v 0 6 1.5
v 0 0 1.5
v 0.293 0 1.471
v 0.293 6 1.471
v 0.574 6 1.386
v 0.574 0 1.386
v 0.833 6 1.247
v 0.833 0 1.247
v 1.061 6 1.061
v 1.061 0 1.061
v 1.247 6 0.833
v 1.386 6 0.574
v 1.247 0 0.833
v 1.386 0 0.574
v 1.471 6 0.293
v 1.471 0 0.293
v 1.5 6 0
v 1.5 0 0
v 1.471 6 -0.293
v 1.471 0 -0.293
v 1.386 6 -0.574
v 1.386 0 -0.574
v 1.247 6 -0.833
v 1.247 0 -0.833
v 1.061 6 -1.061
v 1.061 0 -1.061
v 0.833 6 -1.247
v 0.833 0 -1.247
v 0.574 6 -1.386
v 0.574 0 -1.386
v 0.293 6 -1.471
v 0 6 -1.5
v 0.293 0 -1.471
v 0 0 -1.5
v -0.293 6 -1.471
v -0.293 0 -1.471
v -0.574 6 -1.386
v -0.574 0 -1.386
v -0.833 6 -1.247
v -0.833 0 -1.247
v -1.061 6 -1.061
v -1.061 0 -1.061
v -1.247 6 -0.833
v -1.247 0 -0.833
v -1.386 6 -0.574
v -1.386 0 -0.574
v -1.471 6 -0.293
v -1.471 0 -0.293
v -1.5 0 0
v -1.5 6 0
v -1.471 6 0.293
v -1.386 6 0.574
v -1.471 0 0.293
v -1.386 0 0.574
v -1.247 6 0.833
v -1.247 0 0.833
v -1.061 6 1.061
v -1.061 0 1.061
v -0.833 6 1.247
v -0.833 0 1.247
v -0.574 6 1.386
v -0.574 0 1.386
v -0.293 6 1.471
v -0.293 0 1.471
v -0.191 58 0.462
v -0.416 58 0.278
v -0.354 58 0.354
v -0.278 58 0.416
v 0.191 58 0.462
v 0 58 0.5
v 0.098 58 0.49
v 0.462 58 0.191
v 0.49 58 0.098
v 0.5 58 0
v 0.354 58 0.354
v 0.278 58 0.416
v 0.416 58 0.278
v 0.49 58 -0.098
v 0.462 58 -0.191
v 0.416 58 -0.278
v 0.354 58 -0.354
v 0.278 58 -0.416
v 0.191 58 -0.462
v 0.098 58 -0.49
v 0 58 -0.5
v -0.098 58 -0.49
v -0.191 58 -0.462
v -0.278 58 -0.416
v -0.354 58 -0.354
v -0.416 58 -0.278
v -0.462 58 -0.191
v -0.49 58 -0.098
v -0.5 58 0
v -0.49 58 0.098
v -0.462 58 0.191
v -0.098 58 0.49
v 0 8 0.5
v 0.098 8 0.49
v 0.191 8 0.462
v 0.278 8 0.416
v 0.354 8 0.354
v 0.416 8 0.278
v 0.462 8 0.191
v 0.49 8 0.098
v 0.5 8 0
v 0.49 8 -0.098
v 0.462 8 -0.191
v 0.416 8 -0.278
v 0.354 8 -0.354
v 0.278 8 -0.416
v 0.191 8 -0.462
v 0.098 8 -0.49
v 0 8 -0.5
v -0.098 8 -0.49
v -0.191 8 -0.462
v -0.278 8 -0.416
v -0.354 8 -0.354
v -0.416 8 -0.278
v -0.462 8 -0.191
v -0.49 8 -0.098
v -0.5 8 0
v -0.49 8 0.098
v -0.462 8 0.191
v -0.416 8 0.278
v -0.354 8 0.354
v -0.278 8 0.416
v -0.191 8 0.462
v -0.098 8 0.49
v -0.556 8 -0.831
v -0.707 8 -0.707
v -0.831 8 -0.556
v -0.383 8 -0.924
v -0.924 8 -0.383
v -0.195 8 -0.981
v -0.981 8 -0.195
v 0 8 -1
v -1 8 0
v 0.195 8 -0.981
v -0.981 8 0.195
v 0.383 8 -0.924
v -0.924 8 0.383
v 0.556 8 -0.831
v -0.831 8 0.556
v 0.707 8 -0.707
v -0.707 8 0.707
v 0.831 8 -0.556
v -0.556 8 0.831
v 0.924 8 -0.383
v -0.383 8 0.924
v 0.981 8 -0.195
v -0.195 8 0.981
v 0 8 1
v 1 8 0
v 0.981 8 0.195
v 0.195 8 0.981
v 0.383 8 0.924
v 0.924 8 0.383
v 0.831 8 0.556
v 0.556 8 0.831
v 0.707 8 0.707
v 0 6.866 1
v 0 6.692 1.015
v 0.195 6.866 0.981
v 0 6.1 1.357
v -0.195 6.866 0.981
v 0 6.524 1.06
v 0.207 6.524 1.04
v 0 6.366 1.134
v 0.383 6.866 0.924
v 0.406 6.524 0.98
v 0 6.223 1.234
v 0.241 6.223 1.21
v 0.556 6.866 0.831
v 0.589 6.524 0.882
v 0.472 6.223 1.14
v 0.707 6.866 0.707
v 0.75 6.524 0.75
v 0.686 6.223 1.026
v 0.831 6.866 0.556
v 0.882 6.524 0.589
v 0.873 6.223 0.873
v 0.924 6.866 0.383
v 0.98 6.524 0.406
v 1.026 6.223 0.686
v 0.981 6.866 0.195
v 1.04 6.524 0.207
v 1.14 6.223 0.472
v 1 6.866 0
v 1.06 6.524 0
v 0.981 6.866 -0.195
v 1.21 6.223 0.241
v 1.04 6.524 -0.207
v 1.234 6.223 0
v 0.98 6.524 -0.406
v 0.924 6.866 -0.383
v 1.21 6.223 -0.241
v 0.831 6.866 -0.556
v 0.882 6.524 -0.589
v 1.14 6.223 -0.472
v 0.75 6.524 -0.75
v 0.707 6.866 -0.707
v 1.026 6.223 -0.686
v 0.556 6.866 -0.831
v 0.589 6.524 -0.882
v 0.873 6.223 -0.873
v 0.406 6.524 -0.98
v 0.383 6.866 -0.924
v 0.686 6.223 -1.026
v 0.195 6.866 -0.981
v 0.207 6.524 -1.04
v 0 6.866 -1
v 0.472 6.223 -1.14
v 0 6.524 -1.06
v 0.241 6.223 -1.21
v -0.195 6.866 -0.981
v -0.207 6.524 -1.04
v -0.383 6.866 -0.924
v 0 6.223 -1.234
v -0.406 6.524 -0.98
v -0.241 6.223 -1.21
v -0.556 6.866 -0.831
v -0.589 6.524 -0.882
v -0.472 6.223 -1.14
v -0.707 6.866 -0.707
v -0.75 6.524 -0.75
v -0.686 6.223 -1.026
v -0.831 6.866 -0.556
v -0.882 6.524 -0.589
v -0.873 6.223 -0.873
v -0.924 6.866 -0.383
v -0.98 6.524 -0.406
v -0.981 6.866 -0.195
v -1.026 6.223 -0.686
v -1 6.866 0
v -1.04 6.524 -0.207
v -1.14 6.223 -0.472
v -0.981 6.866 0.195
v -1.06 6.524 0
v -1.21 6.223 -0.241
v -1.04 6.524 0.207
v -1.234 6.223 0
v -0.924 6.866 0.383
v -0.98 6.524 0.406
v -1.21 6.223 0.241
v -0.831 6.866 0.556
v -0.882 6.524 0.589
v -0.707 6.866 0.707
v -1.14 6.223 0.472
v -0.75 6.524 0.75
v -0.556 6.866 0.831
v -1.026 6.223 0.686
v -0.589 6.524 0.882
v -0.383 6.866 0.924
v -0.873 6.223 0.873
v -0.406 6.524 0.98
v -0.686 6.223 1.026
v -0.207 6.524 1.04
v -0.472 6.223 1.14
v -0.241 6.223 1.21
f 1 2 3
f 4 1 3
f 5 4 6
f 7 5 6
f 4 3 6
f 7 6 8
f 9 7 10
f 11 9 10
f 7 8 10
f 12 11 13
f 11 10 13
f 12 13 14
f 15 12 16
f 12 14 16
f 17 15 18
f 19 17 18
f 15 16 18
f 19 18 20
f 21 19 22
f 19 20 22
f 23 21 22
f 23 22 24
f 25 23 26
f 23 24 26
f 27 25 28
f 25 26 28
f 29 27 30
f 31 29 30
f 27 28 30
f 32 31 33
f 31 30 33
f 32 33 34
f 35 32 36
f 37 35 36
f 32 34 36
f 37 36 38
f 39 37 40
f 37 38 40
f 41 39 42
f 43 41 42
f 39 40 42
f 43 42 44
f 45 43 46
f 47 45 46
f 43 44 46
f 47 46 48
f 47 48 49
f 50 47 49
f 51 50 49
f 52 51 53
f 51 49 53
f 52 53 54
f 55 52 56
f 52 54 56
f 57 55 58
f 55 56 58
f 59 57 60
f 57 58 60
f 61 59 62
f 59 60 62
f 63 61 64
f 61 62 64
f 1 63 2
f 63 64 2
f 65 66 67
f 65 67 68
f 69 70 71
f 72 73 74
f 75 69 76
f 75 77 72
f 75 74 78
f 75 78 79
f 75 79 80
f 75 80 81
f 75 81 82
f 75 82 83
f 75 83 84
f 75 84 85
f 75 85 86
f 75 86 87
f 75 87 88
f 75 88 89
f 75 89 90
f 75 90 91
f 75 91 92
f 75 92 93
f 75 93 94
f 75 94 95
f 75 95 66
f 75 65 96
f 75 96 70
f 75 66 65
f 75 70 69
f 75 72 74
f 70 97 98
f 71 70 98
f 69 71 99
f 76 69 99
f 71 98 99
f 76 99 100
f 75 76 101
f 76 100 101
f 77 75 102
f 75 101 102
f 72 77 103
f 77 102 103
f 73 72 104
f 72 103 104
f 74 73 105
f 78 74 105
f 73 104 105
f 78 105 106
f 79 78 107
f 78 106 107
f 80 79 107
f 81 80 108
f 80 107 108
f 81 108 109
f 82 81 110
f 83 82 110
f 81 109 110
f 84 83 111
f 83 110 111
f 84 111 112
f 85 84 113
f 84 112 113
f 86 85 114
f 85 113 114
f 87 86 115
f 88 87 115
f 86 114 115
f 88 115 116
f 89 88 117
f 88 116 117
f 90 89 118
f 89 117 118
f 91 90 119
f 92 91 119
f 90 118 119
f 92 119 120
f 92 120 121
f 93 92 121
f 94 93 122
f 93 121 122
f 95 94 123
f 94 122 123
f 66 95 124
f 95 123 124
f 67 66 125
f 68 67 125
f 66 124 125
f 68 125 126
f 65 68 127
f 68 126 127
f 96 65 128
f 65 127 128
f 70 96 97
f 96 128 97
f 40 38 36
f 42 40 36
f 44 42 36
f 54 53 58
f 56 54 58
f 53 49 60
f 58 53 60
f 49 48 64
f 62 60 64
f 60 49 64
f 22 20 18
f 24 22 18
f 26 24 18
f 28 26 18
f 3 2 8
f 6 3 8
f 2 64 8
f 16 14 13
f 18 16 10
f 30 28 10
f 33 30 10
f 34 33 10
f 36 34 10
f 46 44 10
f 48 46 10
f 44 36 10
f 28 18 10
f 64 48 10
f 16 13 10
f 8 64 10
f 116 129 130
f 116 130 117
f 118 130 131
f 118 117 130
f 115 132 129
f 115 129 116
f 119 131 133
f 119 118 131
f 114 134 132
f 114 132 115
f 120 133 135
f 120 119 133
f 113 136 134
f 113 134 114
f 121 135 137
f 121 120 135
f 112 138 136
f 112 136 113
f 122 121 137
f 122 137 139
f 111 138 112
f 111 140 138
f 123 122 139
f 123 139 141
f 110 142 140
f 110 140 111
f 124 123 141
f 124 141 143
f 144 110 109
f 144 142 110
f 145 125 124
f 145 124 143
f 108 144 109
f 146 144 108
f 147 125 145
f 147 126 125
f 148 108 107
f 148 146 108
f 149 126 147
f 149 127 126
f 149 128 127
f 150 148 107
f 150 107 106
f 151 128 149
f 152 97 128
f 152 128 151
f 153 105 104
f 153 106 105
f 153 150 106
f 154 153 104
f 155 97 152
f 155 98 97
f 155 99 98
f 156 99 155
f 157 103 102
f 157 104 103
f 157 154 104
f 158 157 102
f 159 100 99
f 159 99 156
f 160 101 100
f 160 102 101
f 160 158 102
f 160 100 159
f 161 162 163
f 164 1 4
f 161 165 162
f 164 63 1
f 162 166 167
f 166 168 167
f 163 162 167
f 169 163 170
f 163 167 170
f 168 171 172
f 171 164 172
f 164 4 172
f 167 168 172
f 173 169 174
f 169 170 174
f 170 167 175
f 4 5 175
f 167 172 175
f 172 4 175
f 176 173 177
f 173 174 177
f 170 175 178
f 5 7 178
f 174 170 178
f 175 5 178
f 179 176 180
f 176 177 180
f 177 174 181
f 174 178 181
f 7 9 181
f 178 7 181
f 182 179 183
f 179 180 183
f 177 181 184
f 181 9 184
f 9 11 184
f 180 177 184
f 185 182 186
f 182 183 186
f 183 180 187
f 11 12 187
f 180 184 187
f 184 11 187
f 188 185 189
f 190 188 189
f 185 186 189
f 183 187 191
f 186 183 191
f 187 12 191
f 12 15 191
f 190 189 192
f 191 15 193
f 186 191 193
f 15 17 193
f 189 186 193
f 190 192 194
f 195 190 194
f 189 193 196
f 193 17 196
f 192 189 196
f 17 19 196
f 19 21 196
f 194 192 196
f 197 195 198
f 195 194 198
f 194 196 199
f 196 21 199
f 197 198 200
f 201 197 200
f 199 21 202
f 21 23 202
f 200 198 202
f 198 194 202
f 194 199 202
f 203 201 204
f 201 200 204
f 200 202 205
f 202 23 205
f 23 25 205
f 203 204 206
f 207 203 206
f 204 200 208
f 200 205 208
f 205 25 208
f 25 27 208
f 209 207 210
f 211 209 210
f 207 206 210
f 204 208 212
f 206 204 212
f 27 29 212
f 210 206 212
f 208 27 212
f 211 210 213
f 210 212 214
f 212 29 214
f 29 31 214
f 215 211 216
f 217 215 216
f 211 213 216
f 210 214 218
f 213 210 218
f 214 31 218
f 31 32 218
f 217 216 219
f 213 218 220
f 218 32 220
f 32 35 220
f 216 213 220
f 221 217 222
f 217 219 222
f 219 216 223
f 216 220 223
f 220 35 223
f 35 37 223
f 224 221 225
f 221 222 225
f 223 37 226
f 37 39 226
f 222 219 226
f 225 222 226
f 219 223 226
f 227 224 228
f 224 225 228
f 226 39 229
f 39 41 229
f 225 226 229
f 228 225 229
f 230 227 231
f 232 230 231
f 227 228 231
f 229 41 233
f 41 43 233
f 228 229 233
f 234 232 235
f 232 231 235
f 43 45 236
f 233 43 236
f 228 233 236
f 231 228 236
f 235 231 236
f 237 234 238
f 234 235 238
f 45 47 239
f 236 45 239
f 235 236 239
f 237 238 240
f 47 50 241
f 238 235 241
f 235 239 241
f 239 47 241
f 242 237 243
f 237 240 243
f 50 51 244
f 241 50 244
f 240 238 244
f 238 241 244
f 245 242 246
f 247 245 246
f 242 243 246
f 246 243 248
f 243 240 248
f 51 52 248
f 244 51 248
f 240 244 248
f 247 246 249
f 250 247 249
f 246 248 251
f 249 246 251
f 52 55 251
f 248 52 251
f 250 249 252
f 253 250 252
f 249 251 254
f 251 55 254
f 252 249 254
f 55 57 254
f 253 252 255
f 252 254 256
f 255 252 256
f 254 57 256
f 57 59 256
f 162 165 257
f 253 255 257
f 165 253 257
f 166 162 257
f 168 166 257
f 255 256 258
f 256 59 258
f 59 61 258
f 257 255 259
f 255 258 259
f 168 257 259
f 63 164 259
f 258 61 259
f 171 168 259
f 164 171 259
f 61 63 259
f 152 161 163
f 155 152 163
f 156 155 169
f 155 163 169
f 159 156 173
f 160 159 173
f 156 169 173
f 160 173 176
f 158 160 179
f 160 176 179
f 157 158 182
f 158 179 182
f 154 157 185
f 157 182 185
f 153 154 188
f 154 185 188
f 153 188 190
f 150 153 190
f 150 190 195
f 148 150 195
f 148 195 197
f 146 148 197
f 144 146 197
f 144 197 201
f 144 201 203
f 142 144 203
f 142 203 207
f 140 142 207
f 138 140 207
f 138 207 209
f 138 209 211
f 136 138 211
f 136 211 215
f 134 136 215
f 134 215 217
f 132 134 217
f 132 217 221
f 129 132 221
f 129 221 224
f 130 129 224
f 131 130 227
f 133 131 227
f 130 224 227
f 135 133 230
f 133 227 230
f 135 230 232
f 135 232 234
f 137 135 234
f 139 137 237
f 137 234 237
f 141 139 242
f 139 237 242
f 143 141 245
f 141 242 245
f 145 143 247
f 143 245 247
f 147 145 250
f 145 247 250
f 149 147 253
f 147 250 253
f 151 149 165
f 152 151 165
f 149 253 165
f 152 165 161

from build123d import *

# Parameters (mm, degrees)
SKETCH1_R           = 1.5
BOSS_EXTRUDE1_DEPTH = 6
SKETCH2_R           = 1
BOSS_EXTRUDE2_DEPTH = 2
FILLET1_R           = 1
SKETCH3_R           = 0.5
BOSS_EXTRUDE3_DEPTH = 50


with BuildPart() as part:
    # Sketch1 → Boss-Extrude1 (new body)
    with BuildSketch(Plane(origin=(0, 0, 0), x_dir=(1, 0, 0), z_dir=(0, 1, 0))):
        with Locations(Location((0, 0, 0), (0, 0, 270))):
            Circle(SKETCH1_R)
    extrude(amount=BOSS_EXTRUDE1_DEPTH)

    # Sketch2 → Boss-Extrude2 (add)
    with BuildSketch(Plane(origin=(0, 6, 0), x_dir=(1, 0, 0), z_dir=(0, 1, 0))):
        with Locations(Location((0, 0, 0), (0, 0, 270))):
            Circle(SKETCH2_R)
    extrude(amount=BOSS_EXTRUDE2_DEPTH)

    # Fillet1
    # the kernel refuses this fillet: 1 mm, written as the material it adds along each edge
    with BuildSketch(Plane(origin=(0, 6, 0), x_dir=(0, 0, 1), z_dir=(-1, 0, 0))) as fillet1_piece_1:
        with BuildLine():
            CenterArc((2, 0.866025404), FILLET1_R, 180, 60)
            Line((1, 0.866025404), (0.98, 0.866025404))
            Line((0.98, 0.866025404), (0.98, 0))
            Line((0.98, 0), (1, -0.02))
            ThreePointArc((1, -0.02), (1.25, -0.02), (1.49, -0.017320508))
            Line((1.49, -0.017320508), (1.5, 0))
        make_face()
    revolve(axis=Axis((0, 6, 0), (0, 1, 0)))

    # Sketch3 → Boss-Extrude3 (add)
    with BuildSketch(Plane(origin=(0, 8, 0), x_dir=(1, 0, 0), z_dir=(0, 1, 0))):
        with Locations(Location((0, 0, 0), (0, 0, 270))):
            Circle(SKETCH3_R)
    extrude(amount=BOSS_EXTRUDE3_DEPTH)


solid = part.part
